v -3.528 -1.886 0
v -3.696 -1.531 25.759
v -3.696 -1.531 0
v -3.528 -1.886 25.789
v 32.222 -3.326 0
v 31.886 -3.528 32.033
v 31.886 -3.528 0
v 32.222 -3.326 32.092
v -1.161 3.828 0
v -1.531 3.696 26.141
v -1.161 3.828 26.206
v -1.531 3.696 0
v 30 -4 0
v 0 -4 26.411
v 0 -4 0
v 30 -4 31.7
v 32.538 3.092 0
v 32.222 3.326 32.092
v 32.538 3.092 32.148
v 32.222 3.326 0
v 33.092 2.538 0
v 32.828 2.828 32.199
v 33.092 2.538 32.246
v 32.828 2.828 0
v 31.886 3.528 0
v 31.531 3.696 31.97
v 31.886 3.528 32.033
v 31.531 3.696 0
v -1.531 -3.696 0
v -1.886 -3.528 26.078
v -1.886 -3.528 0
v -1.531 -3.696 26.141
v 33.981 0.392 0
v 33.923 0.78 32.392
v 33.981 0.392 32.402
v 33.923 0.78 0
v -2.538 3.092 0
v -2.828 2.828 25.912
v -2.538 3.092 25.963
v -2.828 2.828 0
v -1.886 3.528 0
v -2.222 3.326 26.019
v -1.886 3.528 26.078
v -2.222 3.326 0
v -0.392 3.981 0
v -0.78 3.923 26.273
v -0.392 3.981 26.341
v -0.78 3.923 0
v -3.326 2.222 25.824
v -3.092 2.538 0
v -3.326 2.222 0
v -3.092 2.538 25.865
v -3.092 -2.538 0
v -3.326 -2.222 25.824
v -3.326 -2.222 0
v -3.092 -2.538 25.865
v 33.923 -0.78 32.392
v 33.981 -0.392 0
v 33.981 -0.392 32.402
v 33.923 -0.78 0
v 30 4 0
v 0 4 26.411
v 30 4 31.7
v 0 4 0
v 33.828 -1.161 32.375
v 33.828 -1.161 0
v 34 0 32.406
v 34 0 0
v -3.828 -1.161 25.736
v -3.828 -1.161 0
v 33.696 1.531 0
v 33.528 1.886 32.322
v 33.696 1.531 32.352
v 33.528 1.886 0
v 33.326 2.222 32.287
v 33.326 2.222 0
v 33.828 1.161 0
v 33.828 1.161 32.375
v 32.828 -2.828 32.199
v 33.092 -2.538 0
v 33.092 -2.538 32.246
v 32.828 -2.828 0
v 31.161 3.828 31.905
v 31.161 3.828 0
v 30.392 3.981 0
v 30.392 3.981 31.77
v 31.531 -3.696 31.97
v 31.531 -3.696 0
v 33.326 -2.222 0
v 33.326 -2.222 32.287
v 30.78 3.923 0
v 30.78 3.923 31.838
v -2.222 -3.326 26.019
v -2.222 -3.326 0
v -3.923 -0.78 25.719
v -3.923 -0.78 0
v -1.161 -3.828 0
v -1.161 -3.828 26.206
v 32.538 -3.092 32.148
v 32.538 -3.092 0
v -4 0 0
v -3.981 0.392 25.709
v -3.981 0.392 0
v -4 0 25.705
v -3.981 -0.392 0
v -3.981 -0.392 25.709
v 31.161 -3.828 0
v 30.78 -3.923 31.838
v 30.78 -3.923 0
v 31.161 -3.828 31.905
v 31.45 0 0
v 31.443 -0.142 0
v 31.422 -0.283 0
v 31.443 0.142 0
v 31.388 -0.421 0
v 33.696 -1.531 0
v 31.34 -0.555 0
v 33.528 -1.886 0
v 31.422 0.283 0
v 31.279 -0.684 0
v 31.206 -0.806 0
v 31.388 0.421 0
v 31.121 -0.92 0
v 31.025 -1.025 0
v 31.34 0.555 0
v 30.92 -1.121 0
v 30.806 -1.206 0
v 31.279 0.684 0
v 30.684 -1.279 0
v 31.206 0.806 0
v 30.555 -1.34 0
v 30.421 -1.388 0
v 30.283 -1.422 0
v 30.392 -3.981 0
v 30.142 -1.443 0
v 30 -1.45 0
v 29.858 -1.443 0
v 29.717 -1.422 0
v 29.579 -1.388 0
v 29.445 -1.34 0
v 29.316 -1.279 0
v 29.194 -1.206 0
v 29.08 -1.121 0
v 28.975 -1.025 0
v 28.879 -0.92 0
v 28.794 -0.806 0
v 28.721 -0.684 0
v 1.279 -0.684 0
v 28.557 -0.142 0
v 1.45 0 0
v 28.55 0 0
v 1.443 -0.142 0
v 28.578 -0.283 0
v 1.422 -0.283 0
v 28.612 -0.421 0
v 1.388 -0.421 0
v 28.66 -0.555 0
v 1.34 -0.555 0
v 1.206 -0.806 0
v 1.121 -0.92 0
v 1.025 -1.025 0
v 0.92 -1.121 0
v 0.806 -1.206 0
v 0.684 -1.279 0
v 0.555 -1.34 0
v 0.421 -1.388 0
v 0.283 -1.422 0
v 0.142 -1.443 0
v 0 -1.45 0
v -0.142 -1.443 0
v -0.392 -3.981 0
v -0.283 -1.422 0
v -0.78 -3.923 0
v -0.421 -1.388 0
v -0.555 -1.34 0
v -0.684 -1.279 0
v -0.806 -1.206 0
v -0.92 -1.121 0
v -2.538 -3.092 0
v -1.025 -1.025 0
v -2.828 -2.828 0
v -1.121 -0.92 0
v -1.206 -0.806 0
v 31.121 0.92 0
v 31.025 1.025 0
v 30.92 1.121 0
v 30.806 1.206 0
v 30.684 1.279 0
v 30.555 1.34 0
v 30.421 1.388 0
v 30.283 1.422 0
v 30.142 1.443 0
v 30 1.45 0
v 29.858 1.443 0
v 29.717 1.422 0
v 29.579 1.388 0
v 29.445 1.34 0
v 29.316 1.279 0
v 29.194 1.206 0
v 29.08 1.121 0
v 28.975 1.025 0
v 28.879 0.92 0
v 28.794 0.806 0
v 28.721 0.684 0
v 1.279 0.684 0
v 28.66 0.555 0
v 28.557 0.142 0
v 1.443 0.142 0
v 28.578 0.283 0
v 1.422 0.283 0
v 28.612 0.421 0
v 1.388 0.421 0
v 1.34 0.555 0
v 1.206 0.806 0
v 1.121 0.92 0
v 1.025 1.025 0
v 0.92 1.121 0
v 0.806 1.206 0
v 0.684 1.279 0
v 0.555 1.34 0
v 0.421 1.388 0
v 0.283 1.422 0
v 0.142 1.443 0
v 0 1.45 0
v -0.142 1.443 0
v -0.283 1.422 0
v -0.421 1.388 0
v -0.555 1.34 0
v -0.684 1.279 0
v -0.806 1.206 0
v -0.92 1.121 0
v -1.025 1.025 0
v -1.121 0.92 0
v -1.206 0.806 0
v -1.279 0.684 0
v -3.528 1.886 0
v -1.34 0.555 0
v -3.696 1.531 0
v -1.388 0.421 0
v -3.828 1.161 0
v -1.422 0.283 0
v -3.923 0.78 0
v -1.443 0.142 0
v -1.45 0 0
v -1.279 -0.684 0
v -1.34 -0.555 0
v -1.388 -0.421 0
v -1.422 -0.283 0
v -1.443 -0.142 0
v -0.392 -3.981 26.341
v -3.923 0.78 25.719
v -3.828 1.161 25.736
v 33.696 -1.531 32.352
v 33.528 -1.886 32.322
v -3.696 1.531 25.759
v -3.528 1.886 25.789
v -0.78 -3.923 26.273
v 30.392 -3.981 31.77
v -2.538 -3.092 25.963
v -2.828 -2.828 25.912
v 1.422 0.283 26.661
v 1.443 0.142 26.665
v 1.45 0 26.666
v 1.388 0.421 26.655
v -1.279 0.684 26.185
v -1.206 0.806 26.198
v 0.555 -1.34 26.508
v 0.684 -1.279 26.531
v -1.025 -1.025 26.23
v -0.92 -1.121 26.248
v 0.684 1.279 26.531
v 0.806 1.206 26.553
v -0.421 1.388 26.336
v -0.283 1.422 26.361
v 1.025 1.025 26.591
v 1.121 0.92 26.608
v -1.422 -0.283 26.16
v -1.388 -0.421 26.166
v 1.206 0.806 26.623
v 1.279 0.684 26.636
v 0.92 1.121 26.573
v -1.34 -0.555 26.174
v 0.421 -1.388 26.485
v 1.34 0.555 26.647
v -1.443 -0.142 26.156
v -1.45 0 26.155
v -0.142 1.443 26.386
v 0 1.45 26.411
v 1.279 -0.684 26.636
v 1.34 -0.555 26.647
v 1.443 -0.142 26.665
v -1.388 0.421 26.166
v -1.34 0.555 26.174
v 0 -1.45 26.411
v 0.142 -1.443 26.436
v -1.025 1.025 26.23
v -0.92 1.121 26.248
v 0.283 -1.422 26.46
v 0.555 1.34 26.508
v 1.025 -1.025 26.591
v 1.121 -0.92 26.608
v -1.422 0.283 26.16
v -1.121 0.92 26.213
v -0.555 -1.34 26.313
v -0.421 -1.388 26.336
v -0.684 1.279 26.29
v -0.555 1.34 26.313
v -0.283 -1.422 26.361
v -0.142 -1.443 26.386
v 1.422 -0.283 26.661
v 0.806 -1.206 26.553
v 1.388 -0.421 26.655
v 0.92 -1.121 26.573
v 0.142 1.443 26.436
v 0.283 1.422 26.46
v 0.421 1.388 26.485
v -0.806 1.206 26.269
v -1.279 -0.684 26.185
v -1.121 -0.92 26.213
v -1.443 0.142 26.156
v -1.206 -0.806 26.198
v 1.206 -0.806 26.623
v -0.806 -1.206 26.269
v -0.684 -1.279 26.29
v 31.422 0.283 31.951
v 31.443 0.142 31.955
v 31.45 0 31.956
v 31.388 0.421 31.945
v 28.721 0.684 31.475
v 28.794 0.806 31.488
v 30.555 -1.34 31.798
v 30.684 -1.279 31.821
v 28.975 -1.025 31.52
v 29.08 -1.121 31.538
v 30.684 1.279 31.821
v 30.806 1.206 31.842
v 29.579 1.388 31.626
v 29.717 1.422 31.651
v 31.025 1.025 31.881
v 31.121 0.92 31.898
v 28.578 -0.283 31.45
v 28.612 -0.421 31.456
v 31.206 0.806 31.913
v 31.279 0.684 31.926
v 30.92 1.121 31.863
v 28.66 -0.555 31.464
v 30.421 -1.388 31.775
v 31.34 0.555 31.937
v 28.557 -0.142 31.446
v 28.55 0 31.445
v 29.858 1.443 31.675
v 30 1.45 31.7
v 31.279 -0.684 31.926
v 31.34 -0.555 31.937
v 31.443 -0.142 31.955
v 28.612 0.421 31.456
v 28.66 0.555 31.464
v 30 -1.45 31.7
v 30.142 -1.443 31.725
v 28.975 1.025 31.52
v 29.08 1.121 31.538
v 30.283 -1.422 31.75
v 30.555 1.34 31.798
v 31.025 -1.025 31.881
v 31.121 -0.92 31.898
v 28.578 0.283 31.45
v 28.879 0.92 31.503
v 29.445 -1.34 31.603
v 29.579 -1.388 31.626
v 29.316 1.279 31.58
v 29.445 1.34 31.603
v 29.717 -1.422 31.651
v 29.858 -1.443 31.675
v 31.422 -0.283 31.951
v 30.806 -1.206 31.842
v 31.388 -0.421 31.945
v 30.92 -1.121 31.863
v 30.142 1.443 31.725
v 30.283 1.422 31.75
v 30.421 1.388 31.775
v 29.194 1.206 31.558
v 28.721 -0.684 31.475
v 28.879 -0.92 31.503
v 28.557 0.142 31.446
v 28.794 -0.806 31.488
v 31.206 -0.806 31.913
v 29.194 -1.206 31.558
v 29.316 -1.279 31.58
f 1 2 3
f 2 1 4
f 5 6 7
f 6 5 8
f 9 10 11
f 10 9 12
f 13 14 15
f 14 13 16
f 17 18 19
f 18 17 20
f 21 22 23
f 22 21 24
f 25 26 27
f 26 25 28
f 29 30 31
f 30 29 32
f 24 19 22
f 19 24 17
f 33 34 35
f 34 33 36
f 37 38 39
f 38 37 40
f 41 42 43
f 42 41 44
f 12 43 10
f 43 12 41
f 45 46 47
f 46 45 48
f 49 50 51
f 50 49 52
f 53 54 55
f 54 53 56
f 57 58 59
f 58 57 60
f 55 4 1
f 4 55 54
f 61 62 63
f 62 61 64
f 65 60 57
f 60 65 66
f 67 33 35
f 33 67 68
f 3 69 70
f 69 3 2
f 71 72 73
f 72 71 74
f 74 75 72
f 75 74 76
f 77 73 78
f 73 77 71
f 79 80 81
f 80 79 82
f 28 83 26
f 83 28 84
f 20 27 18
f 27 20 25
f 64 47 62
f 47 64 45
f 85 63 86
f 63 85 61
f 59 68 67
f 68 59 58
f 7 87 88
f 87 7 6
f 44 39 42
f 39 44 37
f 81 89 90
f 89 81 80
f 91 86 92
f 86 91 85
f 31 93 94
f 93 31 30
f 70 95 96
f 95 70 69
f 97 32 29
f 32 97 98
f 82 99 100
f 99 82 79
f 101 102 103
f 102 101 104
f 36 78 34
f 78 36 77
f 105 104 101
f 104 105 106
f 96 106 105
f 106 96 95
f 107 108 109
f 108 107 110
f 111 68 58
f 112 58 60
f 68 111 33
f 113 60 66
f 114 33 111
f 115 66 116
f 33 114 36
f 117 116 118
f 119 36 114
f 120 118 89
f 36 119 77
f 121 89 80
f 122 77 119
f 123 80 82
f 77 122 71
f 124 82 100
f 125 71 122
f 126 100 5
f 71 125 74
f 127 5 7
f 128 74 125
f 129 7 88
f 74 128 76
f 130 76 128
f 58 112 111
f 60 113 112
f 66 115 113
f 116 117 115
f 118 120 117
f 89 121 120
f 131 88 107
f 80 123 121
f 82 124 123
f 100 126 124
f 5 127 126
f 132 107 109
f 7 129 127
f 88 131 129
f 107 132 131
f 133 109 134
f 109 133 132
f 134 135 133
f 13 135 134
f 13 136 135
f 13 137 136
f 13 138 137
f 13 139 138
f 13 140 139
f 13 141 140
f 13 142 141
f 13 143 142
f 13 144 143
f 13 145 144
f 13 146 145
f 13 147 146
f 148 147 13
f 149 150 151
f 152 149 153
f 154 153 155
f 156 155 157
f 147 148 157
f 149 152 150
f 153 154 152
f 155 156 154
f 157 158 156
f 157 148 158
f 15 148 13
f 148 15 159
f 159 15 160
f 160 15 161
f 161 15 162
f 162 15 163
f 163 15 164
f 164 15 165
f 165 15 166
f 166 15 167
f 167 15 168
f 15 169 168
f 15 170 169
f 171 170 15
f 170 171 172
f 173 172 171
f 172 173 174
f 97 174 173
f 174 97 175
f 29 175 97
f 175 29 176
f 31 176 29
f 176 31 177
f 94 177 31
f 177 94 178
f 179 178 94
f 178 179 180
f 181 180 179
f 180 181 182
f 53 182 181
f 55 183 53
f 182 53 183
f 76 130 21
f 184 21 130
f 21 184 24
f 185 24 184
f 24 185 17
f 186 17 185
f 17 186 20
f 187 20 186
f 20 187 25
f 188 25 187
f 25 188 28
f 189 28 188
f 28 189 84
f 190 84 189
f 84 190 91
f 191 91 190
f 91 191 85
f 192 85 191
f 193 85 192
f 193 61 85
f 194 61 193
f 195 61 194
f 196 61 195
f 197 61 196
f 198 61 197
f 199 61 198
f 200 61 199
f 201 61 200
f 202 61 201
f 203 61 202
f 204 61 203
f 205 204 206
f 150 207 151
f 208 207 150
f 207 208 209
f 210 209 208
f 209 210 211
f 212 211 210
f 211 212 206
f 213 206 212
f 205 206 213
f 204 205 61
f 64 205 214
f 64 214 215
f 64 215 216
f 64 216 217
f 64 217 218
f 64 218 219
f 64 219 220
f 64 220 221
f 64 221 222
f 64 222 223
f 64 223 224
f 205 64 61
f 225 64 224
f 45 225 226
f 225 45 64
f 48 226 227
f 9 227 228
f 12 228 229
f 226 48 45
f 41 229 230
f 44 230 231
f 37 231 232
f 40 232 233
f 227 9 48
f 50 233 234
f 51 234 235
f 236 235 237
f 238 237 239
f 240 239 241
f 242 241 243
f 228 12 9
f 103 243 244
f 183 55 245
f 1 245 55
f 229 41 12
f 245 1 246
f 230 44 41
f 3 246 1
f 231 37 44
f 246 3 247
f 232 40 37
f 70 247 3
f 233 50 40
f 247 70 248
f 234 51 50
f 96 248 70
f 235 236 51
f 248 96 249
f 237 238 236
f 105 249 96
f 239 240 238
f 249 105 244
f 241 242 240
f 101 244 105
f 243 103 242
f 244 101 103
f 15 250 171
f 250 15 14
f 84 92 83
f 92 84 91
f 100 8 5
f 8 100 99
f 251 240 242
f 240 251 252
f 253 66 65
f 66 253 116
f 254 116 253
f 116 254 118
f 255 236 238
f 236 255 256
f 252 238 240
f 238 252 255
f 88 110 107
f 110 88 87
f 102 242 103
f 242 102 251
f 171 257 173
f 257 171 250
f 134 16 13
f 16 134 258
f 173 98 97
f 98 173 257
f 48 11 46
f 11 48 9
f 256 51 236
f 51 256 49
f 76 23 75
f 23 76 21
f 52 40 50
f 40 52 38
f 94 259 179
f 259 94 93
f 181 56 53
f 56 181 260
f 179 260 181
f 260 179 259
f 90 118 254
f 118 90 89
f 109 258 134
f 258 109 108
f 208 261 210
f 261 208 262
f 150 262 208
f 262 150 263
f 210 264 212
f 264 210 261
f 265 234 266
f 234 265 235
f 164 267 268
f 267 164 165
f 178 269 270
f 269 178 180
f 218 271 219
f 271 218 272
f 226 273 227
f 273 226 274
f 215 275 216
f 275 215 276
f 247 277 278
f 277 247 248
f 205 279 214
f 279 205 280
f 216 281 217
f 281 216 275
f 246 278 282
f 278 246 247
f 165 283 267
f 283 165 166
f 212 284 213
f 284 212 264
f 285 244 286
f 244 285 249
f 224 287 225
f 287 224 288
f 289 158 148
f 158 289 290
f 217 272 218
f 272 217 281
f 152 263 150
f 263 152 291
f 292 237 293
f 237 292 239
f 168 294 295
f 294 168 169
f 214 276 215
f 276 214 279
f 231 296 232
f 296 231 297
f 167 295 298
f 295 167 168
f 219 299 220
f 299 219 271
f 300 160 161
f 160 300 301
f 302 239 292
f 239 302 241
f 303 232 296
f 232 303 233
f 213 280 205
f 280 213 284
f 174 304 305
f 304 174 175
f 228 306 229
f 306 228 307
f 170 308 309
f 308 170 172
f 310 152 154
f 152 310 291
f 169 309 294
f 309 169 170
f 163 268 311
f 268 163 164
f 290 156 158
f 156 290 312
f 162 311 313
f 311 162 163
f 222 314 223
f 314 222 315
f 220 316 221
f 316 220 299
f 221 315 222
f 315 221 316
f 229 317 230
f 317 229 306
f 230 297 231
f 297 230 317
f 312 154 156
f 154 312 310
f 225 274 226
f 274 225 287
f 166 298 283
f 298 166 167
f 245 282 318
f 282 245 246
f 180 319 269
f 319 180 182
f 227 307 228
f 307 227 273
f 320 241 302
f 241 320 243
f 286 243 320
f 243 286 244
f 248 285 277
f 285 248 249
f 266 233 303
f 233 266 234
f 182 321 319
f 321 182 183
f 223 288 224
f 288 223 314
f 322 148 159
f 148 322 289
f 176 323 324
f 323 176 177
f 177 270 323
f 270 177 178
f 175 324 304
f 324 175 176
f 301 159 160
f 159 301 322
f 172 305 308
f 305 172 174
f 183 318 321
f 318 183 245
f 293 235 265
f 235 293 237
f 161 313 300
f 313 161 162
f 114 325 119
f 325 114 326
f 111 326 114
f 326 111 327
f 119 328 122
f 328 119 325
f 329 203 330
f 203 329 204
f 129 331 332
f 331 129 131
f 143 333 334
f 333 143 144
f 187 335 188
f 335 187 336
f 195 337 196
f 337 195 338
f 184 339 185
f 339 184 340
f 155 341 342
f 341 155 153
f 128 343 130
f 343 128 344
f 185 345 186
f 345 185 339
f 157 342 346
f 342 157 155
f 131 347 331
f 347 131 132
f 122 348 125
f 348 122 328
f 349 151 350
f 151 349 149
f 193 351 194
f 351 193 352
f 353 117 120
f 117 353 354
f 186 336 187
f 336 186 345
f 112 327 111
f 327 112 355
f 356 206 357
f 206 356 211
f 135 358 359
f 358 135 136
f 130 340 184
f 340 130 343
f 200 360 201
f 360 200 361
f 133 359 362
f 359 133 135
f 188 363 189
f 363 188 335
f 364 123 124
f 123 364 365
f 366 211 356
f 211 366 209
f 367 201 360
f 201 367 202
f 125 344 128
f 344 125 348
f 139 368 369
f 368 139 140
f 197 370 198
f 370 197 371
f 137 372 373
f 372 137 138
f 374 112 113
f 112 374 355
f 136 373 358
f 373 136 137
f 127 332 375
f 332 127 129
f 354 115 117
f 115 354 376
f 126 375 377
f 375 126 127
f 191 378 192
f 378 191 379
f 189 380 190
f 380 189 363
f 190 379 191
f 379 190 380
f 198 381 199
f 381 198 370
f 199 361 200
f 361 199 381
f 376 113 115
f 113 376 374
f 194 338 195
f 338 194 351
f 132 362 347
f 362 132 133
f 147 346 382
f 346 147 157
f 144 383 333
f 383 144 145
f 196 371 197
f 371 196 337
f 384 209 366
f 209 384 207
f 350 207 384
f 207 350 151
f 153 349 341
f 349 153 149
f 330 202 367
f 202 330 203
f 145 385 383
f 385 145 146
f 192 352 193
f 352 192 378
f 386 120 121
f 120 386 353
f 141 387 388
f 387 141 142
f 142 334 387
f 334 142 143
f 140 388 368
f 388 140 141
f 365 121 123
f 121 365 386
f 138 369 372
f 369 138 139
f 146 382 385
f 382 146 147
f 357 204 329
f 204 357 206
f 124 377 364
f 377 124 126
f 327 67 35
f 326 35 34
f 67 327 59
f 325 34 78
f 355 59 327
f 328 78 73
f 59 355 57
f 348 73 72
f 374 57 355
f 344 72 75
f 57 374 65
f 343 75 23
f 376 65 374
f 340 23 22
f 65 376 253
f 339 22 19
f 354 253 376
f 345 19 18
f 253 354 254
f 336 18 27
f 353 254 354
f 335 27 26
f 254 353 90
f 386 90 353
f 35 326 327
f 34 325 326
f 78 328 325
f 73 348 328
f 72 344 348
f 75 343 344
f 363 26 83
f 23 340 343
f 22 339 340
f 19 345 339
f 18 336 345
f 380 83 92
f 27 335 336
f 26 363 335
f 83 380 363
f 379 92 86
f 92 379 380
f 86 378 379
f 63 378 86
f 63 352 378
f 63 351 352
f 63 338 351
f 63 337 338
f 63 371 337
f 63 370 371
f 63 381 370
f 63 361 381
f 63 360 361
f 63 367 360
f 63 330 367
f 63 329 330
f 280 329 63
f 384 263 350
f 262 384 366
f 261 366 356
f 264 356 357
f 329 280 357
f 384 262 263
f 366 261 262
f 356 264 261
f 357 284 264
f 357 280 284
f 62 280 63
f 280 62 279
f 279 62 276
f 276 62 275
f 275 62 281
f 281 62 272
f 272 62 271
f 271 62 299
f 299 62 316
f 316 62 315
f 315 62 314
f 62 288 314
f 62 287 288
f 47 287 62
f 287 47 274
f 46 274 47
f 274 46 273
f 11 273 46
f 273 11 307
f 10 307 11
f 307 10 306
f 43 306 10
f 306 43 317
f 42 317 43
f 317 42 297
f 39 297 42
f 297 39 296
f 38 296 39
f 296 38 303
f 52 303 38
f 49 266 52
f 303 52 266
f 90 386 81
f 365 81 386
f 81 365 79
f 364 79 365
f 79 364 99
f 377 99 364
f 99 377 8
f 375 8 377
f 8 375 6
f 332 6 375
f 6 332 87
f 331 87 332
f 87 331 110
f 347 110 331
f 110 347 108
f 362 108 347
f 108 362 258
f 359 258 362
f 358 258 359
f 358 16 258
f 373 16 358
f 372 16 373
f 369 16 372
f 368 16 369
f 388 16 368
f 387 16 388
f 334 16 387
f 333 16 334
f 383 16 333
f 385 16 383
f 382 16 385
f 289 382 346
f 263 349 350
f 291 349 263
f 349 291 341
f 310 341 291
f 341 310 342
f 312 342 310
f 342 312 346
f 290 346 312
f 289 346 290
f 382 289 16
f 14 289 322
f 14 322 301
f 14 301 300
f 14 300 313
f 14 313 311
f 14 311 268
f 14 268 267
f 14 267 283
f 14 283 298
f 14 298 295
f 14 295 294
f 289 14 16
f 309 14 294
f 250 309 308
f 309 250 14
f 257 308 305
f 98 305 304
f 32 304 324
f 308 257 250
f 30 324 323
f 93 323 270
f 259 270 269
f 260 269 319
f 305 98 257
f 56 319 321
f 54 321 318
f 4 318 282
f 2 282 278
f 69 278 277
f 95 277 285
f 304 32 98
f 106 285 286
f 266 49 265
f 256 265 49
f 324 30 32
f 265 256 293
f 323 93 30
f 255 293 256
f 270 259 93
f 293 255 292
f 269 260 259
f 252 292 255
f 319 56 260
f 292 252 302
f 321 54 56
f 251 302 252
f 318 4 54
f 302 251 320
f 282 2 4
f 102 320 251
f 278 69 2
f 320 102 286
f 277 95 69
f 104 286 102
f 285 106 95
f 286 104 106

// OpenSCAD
h = 25;
skruv = 2.9;
tjock = 8;
l = 30;
vinkel = 10;

difference() {
    hull() {
        cylinder(d=tjock, h = h*2, $fn=64);
        translate([l,0,0]) cylinder(d=tjock, h = h*2, $fn=64);
        
    }
    cylinder(d=skruv, h = h*2, $fn=64);
    translate([l,0,0]) cylinder(d=skruv, h = h*2, $fn=64);
    translate([-tjock,-l,h]) rotate([0,-vinkel,0]) cube(l*2,l*2,h*3);
    
}
